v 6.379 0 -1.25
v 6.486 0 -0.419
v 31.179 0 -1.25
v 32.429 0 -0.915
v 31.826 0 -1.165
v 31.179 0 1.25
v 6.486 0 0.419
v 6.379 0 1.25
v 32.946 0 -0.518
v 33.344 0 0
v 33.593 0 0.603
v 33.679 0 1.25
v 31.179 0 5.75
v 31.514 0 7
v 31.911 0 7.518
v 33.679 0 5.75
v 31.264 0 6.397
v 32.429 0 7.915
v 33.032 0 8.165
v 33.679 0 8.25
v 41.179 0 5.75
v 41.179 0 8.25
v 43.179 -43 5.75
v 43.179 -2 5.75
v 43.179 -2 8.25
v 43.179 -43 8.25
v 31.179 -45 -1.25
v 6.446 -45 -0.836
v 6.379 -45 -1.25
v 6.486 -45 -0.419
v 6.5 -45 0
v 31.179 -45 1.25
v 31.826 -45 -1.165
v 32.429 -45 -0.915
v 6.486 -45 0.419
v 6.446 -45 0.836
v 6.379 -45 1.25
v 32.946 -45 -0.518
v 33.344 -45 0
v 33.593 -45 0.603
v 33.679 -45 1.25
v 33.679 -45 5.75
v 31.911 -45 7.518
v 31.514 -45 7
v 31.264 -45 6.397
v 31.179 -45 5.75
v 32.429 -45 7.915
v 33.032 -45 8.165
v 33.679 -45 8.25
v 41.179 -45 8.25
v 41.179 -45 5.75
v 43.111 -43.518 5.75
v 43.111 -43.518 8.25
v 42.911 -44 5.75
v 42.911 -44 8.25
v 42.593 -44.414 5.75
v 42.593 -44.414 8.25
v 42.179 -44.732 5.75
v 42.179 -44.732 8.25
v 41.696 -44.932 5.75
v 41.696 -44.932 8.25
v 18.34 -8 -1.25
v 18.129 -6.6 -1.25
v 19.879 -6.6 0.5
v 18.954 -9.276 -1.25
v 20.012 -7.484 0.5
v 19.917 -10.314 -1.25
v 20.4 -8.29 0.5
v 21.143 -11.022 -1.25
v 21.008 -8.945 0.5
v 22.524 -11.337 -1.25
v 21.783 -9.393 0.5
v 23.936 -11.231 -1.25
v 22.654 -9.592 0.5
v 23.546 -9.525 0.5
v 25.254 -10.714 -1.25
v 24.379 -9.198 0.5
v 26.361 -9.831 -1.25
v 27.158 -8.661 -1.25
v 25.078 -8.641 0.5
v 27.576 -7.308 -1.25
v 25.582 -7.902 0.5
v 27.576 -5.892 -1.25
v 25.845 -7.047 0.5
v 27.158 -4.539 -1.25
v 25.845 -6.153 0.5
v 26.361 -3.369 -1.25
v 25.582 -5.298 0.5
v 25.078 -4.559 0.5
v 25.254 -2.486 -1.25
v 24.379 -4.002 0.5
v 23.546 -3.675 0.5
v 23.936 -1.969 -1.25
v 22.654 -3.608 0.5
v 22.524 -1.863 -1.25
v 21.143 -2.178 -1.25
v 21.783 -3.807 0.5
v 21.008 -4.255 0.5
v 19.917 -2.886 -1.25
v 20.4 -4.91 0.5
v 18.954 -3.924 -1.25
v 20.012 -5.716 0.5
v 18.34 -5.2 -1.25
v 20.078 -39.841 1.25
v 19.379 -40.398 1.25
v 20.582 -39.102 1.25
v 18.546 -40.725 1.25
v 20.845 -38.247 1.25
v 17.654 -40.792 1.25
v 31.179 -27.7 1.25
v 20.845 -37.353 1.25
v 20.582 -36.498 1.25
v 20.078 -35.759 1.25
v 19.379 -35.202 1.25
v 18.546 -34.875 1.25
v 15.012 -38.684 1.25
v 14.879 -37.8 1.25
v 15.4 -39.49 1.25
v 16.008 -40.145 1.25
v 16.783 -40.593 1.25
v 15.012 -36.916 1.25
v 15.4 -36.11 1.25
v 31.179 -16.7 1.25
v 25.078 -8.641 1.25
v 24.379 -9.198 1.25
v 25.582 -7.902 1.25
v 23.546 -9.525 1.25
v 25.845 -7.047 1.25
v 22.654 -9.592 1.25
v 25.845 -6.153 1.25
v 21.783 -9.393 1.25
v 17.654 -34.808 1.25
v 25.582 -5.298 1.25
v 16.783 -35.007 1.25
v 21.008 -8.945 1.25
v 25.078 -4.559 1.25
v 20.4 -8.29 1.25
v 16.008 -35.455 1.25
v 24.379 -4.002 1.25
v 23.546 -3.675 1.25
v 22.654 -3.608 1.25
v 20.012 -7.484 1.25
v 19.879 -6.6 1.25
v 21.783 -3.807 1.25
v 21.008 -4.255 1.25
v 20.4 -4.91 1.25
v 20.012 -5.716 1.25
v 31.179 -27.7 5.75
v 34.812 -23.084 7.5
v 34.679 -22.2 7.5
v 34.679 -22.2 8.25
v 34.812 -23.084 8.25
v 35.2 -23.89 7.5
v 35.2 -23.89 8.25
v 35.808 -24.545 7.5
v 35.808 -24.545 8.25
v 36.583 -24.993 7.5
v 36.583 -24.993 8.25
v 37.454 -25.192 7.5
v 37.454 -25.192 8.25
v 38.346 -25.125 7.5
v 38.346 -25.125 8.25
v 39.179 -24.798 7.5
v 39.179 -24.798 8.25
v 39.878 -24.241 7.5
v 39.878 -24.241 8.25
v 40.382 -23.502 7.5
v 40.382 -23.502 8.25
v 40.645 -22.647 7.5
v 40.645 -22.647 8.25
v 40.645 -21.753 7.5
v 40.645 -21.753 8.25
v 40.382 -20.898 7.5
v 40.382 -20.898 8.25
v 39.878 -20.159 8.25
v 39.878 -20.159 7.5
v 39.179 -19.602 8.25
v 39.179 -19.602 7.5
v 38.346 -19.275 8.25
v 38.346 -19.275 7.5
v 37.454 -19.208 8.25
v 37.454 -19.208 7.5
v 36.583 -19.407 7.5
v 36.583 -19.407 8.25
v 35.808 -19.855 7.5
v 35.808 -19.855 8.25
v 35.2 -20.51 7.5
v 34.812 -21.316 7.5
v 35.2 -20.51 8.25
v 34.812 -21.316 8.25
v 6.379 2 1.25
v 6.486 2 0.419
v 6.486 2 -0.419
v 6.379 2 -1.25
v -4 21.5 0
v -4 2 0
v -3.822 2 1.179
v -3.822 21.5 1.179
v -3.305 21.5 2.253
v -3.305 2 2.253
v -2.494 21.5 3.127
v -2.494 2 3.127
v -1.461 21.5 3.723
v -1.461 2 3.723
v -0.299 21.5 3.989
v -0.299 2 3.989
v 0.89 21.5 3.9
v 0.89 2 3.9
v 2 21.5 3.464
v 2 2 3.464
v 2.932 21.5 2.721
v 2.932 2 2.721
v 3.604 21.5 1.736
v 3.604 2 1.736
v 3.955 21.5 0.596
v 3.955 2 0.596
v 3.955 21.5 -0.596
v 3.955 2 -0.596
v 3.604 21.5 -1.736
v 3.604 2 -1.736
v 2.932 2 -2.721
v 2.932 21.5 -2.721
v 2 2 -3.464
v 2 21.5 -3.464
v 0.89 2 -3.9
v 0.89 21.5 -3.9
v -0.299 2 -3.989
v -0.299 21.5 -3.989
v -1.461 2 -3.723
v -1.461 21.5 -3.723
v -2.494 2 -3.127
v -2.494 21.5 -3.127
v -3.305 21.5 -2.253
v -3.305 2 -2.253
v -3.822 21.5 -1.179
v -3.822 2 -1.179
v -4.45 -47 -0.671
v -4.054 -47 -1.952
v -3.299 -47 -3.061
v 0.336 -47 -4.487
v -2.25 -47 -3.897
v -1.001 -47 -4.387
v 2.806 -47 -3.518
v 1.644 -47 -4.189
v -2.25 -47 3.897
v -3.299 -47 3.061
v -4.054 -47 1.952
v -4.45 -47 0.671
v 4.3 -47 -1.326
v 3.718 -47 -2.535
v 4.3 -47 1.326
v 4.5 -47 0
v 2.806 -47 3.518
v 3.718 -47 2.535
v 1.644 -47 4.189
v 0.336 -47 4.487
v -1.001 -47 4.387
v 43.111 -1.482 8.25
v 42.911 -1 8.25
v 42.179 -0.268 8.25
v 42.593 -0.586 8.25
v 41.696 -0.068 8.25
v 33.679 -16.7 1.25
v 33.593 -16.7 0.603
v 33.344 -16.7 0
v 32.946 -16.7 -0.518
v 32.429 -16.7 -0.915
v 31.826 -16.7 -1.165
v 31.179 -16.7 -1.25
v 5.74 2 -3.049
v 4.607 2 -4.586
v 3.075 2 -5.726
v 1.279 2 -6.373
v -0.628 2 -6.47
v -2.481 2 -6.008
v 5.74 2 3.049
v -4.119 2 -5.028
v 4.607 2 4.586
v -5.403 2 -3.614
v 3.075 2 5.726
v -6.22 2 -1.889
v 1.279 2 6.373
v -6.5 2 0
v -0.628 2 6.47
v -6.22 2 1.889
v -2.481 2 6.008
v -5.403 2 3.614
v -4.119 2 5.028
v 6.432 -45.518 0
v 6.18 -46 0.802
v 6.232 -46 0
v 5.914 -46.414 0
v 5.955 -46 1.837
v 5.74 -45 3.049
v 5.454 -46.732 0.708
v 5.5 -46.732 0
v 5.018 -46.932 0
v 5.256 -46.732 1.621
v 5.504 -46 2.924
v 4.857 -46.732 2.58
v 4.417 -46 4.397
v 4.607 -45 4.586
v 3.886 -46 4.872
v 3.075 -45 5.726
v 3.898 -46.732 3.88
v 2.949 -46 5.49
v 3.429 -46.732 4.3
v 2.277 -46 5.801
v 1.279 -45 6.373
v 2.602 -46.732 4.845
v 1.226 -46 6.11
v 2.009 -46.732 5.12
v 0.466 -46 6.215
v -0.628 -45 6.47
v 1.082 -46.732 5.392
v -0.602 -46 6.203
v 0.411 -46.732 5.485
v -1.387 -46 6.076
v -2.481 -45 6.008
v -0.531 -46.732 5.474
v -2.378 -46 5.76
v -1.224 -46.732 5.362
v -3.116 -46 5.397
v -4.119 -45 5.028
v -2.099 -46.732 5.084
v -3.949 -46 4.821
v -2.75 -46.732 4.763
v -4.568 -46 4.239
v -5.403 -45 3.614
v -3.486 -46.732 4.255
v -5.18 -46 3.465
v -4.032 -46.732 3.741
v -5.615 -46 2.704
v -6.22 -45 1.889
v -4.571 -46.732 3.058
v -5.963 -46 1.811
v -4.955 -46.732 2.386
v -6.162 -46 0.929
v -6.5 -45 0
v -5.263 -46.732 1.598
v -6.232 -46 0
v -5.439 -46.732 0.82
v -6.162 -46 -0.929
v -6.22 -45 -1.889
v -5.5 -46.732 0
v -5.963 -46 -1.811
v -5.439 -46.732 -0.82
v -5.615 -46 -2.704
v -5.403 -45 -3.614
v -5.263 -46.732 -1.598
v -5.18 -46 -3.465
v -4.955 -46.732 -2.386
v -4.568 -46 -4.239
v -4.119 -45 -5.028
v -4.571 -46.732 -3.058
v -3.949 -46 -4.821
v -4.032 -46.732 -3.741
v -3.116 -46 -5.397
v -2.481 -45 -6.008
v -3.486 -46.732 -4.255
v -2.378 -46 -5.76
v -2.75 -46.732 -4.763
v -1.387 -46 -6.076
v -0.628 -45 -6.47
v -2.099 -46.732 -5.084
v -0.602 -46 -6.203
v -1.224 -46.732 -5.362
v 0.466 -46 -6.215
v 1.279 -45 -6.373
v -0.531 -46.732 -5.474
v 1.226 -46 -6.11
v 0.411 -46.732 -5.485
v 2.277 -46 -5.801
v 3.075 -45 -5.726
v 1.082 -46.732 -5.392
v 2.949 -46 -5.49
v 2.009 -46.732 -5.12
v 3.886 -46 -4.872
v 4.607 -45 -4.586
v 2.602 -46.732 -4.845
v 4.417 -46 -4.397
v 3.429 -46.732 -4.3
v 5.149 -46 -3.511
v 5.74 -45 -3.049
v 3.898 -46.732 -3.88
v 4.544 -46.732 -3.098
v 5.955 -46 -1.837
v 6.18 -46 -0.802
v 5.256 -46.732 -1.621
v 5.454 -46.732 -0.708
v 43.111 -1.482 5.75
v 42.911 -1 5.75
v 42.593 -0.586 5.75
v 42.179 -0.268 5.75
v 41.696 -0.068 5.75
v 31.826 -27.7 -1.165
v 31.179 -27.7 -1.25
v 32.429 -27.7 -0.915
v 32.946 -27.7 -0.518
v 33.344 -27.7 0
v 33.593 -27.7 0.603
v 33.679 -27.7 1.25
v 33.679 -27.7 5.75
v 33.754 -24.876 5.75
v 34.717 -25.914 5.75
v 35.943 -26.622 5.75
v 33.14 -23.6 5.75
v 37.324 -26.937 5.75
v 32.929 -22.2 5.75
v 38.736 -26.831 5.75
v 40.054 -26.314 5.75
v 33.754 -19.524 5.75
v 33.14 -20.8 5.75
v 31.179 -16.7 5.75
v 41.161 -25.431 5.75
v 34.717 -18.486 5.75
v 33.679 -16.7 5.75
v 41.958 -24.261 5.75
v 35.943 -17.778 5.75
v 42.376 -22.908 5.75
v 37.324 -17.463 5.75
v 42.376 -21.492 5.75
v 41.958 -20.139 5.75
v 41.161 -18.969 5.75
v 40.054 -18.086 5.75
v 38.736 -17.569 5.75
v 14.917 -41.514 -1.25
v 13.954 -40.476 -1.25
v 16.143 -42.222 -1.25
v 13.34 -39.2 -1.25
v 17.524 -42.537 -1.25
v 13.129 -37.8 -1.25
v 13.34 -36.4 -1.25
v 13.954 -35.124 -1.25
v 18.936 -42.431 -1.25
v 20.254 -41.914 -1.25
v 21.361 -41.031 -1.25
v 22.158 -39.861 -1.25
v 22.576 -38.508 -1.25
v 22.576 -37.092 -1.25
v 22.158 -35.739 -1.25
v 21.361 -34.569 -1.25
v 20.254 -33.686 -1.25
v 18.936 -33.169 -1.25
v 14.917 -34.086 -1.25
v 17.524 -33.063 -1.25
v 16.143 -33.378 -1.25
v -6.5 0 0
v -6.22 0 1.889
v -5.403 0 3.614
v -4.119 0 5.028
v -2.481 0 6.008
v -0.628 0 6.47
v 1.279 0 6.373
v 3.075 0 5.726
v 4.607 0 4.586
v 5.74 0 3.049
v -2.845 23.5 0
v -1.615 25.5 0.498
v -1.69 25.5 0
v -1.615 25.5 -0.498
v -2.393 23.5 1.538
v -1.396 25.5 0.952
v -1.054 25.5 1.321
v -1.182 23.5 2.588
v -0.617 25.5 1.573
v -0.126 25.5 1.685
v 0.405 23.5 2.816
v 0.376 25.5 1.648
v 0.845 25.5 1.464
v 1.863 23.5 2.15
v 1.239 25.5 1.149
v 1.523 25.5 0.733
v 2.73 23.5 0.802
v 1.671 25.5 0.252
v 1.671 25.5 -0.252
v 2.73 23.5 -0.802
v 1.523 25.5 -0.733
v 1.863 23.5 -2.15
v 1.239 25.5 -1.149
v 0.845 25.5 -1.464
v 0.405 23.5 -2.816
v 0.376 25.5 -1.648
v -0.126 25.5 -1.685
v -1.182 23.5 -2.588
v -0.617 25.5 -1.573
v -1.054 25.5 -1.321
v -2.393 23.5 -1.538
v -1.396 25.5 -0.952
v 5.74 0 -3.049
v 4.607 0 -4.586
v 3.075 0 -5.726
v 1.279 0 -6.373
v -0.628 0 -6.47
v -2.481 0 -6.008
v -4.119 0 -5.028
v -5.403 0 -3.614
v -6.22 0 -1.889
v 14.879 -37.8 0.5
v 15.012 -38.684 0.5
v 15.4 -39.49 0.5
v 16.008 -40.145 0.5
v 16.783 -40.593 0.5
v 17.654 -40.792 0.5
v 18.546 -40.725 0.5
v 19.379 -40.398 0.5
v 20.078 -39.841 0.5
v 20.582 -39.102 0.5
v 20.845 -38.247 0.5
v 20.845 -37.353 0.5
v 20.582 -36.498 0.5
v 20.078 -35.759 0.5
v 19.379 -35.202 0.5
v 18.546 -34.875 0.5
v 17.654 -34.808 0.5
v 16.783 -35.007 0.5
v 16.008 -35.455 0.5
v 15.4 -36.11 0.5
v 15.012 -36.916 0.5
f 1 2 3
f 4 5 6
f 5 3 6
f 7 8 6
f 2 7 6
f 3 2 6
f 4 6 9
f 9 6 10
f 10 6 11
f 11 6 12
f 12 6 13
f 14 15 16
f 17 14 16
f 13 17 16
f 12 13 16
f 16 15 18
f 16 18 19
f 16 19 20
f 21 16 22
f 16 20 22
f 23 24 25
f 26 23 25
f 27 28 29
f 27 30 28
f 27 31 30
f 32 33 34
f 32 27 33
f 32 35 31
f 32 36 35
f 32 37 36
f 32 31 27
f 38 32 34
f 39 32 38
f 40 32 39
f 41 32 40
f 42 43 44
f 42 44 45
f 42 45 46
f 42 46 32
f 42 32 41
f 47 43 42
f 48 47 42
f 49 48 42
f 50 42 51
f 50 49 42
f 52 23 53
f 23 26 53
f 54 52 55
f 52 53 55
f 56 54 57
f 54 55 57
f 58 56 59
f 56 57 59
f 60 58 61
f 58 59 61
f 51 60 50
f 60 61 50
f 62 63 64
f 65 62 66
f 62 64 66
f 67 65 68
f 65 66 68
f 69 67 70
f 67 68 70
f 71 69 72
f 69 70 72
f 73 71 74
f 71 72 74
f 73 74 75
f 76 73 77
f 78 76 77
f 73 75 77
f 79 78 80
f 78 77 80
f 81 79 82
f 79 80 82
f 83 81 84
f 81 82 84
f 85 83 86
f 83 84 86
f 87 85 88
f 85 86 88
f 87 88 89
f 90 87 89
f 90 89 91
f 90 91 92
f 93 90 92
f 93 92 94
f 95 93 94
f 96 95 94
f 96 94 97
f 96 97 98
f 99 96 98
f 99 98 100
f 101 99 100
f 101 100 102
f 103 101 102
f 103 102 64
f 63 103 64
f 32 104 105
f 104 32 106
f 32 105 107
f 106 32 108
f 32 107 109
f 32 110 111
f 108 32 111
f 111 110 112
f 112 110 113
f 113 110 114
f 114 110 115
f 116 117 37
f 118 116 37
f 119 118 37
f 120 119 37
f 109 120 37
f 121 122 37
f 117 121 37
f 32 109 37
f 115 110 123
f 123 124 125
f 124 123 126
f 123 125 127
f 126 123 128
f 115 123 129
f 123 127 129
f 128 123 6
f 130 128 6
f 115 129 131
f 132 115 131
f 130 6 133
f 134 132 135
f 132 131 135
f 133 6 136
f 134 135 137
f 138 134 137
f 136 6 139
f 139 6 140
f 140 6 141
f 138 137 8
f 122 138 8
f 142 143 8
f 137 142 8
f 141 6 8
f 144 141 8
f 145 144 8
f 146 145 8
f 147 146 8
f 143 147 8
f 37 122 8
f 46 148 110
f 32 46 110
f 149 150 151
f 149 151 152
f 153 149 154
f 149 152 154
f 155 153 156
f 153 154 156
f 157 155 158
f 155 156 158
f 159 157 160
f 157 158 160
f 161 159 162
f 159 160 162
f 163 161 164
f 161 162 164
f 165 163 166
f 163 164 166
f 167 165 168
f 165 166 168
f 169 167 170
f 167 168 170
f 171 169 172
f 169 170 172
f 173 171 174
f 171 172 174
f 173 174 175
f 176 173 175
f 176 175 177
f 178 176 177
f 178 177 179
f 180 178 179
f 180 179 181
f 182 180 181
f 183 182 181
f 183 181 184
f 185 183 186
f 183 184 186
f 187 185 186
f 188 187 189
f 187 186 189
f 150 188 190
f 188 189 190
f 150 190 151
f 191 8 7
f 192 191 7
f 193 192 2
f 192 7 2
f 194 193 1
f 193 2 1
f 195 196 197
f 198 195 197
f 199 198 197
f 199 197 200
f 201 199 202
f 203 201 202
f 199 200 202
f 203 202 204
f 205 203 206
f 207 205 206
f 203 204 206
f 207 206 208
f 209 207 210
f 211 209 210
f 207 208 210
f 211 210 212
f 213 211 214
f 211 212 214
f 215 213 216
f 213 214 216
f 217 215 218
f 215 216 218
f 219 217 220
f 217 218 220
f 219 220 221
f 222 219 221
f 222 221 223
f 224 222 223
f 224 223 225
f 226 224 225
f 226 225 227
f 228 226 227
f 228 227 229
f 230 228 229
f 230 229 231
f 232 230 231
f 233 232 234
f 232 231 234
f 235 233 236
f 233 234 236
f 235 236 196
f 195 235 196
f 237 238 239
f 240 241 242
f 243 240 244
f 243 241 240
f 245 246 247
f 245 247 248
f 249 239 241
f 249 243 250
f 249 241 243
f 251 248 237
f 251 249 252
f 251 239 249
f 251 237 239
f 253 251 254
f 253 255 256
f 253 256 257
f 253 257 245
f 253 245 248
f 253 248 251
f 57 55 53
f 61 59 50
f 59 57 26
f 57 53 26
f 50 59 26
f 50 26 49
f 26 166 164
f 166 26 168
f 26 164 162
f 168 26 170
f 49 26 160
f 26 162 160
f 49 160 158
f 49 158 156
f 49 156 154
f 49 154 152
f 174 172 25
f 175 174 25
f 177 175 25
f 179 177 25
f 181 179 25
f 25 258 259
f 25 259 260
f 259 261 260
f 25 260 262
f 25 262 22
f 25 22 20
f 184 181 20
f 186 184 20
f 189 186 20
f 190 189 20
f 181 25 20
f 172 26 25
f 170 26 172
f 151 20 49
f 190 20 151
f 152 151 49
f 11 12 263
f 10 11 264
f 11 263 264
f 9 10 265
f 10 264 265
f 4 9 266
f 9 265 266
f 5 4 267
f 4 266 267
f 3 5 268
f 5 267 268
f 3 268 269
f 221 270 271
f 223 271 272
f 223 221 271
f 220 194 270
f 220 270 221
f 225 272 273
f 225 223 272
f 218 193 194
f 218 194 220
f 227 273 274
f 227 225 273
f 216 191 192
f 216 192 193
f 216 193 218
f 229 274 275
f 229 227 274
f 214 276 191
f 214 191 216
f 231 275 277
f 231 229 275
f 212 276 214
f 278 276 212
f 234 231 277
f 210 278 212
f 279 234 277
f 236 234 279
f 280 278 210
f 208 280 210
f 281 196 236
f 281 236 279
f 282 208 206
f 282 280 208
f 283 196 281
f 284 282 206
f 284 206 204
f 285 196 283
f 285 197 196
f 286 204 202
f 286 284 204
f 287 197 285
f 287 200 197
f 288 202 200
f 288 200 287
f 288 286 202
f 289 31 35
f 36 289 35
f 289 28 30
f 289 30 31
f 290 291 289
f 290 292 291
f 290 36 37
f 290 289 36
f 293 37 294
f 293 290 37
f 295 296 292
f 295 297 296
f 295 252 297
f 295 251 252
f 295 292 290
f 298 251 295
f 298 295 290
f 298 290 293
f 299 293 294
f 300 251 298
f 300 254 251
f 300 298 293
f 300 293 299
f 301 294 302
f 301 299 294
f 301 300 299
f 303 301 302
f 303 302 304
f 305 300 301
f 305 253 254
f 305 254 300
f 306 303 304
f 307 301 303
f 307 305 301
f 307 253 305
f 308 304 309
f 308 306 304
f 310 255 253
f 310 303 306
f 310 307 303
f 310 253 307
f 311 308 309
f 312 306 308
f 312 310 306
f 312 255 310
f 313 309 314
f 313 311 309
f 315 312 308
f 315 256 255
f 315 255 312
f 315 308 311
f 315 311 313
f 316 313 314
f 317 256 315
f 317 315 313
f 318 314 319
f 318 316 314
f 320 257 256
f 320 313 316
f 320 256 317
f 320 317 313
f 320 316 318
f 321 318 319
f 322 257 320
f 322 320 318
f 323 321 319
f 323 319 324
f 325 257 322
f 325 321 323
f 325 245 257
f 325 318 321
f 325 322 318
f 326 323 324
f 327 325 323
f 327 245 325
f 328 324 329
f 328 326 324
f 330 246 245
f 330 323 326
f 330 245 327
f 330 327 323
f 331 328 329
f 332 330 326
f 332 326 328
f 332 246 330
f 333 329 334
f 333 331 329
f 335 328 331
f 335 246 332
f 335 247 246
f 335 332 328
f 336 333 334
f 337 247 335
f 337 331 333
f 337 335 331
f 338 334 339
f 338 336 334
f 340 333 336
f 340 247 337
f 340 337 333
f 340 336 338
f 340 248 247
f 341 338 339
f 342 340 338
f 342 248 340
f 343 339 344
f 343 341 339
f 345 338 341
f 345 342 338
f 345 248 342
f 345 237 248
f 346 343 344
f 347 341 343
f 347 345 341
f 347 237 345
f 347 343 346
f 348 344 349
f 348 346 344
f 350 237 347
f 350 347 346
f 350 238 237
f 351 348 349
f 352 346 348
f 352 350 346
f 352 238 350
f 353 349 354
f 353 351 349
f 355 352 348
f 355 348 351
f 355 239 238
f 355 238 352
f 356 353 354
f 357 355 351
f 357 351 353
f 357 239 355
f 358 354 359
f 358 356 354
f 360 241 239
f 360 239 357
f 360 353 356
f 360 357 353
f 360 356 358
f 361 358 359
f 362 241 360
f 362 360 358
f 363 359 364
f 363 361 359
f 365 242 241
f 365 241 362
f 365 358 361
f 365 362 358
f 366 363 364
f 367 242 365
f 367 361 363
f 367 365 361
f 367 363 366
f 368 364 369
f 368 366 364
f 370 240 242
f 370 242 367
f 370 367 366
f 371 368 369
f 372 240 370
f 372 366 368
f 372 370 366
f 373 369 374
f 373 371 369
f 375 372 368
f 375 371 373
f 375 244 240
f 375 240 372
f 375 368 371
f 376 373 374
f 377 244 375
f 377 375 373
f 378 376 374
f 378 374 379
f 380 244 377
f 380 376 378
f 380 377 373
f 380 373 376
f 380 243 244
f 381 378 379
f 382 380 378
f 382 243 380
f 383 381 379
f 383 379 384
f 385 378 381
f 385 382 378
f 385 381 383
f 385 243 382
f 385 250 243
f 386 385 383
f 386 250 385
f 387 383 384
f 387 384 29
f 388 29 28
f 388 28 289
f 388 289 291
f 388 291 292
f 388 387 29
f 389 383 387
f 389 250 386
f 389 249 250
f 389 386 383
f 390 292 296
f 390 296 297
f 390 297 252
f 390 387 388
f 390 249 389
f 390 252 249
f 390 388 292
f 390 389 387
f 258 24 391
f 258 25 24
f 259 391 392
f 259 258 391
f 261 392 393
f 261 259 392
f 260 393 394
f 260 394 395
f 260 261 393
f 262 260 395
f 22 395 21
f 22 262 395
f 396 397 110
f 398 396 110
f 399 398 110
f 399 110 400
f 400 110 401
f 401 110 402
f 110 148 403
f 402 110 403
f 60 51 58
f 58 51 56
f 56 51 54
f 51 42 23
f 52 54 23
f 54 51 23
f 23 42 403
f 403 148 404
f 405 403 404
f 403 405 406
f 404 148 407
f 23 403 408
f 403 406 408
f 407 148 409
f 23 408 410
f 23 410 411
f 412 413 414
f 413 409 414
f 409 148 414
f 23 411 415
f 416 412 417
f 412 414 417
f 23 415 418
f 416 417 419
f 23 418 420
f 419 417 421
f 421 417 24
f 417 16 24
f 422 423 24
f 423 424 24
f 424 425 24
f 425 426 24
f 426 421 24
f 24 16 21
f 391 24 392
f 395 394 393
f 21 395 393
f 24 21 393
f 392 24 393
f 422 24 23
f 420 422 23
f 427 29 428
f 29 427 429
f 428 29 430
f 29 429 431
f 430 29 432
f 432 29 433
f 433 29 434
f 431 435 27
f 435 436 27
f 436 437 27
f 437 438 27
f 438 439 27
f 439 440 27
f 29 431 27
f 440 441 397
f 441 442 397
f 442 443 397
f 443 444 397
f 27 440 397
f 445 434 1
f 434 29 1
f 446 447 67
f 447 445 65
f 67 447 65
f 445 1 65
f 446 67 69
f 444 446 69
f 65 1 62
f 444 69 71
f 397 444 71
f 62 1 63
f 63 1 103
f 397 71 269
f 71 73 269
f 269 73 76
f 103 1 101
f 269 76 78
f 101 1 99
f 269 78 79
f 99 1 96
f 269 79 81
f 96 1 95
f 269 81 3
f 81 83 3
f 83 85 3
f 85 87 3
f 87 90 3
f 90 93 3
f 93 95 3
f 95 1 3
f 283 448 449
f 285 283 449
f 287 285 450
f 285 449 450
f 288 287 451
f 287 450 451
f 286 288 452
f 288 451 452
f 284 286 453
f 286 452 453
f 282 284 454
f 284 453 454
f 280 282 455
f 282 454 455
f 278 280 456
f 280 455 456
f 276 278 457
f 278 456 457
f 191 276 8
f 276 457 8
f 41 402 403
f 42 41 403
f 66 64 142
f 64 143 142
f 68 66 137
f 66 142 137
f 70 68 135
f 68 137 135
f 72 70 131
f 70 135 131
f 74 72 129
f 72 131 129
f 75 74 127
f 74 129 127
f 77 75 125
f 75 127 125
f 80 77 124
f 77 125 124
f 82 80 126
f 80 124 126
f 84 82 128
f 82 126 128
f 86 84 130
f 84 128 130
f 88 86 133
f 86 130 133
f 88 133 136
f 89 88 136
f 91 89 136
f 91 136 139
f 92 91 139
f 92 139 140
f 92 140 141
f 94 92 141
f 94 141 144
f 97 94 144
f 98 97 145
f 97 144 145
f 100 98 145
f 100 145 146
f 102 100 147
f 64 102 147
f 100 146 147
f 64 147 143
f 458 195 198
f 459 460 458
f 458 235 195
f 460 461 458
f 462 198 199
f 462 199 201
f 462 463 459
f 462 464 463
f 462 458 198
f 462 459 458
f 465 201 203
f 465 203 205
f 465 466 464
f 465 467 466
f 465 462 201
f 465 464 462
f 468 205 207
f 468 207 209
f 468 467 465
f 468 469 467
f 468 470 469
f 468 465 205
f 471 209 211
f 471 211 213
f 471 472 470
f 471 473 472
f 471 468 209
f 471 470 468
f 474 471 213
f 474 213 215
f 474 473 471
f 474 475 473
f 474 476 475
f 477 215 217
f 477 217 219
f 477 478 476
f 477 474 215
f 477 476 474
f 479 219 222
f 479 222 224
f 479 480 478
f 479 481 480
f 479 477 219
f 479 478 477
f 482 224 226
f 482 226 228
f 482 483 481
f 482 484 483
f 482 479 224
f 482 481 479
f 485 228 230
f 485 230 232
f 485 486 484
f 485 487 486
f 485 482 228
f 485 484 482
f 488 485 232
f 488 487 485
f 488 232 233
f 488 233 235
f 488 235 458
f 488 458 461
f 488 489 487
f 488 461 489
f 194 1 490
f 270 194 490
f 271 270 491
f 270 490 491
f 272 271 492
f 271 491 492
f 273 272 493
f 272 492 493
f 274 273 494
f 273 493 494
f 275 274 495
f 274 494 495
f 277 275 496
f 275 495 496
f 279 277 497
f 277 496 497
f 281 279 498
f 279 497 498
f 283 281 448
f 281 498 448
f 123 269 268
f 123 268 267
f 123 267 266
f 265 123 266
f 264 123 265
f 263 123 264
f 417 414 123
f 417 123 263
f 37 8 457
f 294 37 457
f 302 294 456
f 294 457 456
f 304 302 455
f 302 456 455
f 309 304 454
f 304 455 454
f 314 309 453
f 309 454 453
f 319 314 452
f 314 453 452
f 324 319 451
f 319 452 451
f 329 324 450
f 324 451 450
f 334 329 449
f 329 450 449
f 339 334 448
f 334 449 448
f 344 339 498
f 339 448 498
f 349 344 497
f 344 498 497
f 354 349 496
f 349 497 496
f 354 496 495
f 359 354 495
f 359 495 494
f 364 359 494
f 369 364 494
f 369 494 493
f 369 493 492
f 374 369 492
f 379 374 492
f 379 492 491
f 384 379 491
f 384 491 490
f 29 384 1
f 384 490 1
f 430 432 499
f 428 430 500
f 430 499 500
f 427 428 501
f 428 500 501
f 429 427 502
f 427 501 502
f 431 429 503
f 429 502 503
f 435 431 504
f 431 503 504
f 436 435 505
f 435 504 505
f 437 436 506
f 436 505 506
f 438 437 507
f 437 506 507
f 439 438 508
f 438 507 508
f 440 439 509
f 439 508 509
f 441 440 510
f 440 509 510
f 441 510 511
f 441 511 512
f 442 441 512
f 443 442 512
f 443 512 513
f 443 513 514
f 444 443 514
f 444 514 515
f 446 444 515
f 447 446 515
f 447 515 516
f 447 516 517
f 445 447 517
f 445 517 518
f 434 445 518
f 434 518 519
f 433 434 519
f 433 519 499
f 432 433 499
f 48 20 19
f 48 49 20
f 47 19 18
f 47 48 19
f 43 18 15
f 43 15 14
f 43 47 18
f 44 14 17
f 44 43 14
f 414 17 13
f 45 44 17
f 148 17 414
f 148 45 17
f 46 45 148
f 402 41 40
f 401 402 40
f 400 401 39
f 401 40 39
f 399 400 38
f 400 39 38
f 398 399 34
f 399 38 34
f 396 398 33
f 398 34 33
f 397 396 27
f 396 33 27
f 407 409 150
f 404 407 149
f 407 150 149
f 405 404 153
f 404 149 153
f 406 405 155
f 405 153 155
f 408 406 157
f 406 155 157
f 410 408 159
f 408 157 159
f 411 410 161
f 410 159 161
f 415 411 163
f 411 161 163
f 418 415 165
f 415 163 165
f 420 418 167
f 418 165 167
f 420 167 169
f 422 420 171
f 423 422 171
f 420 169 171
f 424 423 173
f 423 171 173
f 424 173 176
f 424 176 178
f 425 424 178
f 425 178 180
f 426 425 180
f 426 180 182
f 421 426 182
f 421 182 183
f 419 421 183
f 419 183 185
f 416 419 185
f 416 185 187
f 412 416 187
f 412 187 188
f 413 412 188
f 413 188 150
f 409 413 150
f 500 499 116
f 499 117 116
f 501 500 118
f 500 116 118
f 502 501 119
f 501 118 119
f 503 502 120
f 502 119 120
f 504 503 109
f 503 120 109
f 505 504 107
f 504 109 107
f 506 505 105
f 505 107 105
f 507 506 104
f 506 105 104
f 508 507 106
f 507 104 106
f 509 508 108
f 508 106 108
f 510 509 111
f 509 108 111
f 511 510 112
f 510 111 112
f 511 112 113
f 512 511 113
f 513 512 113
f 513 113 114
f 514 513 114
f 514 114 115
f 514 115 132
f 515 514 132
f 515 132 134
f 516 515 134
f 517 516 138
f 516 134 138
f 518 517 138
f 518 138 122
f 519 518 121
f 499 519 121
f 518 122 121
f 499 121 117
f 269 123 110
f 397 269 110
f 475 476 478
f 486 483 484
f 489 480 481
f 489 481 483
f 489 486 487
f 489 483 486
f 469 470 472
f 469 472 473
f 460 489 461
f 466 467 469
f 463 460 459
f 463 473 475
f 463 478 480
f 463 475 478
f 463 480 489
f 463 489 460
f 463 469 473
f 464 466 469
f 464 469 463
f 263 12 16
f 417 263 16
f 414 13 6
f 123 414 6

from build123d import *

# Parameters (mm, degrees)
F1_DEPTH        = 45
F2_R            = 2
F3_R            = 2.5
F5_DEPTH        = 2
F6_R            = 4
F7_DEPTH        = 23.5
F8_SIZE2        = 2.31
F8_SIZE         = 4
F10_D           = 6
F10_CSINK_D     = 9.5
F10_CSINK_ANGLE = 90
F11_R           = 6.5
F12_DEPTH       = 2
F14_W           = 5
F14_H           = 11
F15_DEPTH       = 25
F16_D           = 6
F16_CSINK_D     = 9.5
F16_CSINK_ANGLE = 90


# Not quite as in the source:
# - a fillet or chamfer that OpenCascade refuses, or shapes differently, is made with other operations: its cross-section is extruded or revolved along the edge and cut away or added
# - a feature names something its author has since deleted; it is built from what else it names


with BuildPart() as f1:
    # F0 (on Front) → F1 (new body)
    with BuildSketch(Plane.XZ):
        with BuildLine():
            Line((31.1786754111, 1.25), (6.3786754111, 1.25))
            ThreePointArc((6.3786754111, 1.25), (-6.5, 0), (6.3786754111, -1.25))
            Line((6.3786754111, -1.25), (33.6786754111, -1.25))
            Line((33.6786754111, -1.25), (33.6786754111, 5.75))
            Line((33.6786754111, 5.75), (43.1786754111, 5.75))
            Line((43.1786754111, 5.75), (43.1786754111, 8.25))
            Line((43.1786754111, 8.25), (31.1786754111, 8.25))
            Line((31.1786754111, 8.25), (31.1786754111, 1.25))
        make_face()
    extrude(amount=F1_DEPTH)

    # F2
    f2_edges = [f1.edges().sort_by_distance(p)[0] for p in [
        (43.178675, -45, 7),
        (43.178675, 0, 7),
    ]]
    fillet(f2_edges, radius=F2_R)

    # F3
    f3_edges = [f1.edges().sort_by_distance(p)[0] for p in [
        (33.678675, -22.5, -1.25),
        (31.178675, -22.5, 8.25),
    ]]
    fillet(f3_edges, radius=F3_R)

    # F4 (on face) → F5 (join)
    with BuildSketch(Plane(origin=(0, 0, 0), x_dir=(-1, 0, 0), z_dir=(0, 1, 0))):
        with BuildLine():
            ThreePointArc((-6.3786754111, -1.25), (0.6279370303, -6.469597753), (6.5, 0))
            ThreePointArc((6.5, 0), (0.6279370303, 6.469597753), (-6.3786754111, 1.25))
            ThreePointArc((-6.3786754111, 1.25), (-6.5, 0), (-6.3786754111, -1.25))
        make_face()
    extrude(amount=F5_DEPTH)

    # F6 (on face) → F7 (join)
    with BuildSketch(Plane(origin=(0, 2, 0), x_dir=(-1, 0, 0), z_dir=(0, 1, 0))):
        Circle(F6_R)
    extrude(amount=F7_DEPTH)

    # F8
    f8_edges = [f1.edges().sort_by_distance(p)[0] for p in [
        (4, 25.5, 0),
    ]]
    f8_side = f1.faces().sort_by_distance((4, 13.75, 0))[0]
    chamfer(f8_edges, length=F8_SIZE, length2=F8_SIZE2, reference=f8_side)

    # F10 (through all)
    with Locations(Plane(origin=(0, 0, -1.25), x_dir=(1, 0, 0), z_dir=(0, 0, -1))):
        with Locations((22.8786754111, 6.6), (17.8786754111, 37.8)):
            CounterSinkHole(F10_D / 2, F10_CSINK_D / 2, counter_sink_angle=F10_CSINK_ANGLE)

    # F11 (on face) → F12 (join)
    with BuildSketch(Plane.XZ.offset(45)):
        Circle(F11_R)
    extrude(amount=F12_DEPTH)

    # F13: fillet of radius 2 on 1 edges, made by hand

    # F13_s1 → F13_t2 (revolve, cut)
    with BuildSketch(Plane.XY):
        with BuildLine():
            ThreePointArc((6.5, -45), (5.9142135624, -46.4142135624), (4.5, -47))
            Line((4.5, -47), (6.5, -47))
            Line((6.5, -47), (6.5, -45))
        make_face()
    revolve(axis=Axis((0, -47, 0), (0, -1, 0)), mode=Mode.SUBTRACT)

    # F14 (on face) → F15 (cut)
    with BuildSketch(Plane(origin=(0, 0, 5.75), x_dir=(1, 0, 0), z_dir=(0, 0, -1))):
        with Locations((33.6786754111, 22.2)):
            Rectangle(F14_W, F14_H)
    extrude(amount=F15_DEPTH, mode=Mode.SUBTRACT)

    # F16 (through all)
    with Locations(Plane(origin=(0, 0, 5.75), x_dir=(1, 0, 0), z_dir=(0, 0, -1))):
        with Locations((37.6786754111, 22.2)):
            CounterSinkHole(F16_D / 2, F16_CSINK_D / 2, counter_sink_angle=F16_CSINK_ANGLE)


solid = f1.part
